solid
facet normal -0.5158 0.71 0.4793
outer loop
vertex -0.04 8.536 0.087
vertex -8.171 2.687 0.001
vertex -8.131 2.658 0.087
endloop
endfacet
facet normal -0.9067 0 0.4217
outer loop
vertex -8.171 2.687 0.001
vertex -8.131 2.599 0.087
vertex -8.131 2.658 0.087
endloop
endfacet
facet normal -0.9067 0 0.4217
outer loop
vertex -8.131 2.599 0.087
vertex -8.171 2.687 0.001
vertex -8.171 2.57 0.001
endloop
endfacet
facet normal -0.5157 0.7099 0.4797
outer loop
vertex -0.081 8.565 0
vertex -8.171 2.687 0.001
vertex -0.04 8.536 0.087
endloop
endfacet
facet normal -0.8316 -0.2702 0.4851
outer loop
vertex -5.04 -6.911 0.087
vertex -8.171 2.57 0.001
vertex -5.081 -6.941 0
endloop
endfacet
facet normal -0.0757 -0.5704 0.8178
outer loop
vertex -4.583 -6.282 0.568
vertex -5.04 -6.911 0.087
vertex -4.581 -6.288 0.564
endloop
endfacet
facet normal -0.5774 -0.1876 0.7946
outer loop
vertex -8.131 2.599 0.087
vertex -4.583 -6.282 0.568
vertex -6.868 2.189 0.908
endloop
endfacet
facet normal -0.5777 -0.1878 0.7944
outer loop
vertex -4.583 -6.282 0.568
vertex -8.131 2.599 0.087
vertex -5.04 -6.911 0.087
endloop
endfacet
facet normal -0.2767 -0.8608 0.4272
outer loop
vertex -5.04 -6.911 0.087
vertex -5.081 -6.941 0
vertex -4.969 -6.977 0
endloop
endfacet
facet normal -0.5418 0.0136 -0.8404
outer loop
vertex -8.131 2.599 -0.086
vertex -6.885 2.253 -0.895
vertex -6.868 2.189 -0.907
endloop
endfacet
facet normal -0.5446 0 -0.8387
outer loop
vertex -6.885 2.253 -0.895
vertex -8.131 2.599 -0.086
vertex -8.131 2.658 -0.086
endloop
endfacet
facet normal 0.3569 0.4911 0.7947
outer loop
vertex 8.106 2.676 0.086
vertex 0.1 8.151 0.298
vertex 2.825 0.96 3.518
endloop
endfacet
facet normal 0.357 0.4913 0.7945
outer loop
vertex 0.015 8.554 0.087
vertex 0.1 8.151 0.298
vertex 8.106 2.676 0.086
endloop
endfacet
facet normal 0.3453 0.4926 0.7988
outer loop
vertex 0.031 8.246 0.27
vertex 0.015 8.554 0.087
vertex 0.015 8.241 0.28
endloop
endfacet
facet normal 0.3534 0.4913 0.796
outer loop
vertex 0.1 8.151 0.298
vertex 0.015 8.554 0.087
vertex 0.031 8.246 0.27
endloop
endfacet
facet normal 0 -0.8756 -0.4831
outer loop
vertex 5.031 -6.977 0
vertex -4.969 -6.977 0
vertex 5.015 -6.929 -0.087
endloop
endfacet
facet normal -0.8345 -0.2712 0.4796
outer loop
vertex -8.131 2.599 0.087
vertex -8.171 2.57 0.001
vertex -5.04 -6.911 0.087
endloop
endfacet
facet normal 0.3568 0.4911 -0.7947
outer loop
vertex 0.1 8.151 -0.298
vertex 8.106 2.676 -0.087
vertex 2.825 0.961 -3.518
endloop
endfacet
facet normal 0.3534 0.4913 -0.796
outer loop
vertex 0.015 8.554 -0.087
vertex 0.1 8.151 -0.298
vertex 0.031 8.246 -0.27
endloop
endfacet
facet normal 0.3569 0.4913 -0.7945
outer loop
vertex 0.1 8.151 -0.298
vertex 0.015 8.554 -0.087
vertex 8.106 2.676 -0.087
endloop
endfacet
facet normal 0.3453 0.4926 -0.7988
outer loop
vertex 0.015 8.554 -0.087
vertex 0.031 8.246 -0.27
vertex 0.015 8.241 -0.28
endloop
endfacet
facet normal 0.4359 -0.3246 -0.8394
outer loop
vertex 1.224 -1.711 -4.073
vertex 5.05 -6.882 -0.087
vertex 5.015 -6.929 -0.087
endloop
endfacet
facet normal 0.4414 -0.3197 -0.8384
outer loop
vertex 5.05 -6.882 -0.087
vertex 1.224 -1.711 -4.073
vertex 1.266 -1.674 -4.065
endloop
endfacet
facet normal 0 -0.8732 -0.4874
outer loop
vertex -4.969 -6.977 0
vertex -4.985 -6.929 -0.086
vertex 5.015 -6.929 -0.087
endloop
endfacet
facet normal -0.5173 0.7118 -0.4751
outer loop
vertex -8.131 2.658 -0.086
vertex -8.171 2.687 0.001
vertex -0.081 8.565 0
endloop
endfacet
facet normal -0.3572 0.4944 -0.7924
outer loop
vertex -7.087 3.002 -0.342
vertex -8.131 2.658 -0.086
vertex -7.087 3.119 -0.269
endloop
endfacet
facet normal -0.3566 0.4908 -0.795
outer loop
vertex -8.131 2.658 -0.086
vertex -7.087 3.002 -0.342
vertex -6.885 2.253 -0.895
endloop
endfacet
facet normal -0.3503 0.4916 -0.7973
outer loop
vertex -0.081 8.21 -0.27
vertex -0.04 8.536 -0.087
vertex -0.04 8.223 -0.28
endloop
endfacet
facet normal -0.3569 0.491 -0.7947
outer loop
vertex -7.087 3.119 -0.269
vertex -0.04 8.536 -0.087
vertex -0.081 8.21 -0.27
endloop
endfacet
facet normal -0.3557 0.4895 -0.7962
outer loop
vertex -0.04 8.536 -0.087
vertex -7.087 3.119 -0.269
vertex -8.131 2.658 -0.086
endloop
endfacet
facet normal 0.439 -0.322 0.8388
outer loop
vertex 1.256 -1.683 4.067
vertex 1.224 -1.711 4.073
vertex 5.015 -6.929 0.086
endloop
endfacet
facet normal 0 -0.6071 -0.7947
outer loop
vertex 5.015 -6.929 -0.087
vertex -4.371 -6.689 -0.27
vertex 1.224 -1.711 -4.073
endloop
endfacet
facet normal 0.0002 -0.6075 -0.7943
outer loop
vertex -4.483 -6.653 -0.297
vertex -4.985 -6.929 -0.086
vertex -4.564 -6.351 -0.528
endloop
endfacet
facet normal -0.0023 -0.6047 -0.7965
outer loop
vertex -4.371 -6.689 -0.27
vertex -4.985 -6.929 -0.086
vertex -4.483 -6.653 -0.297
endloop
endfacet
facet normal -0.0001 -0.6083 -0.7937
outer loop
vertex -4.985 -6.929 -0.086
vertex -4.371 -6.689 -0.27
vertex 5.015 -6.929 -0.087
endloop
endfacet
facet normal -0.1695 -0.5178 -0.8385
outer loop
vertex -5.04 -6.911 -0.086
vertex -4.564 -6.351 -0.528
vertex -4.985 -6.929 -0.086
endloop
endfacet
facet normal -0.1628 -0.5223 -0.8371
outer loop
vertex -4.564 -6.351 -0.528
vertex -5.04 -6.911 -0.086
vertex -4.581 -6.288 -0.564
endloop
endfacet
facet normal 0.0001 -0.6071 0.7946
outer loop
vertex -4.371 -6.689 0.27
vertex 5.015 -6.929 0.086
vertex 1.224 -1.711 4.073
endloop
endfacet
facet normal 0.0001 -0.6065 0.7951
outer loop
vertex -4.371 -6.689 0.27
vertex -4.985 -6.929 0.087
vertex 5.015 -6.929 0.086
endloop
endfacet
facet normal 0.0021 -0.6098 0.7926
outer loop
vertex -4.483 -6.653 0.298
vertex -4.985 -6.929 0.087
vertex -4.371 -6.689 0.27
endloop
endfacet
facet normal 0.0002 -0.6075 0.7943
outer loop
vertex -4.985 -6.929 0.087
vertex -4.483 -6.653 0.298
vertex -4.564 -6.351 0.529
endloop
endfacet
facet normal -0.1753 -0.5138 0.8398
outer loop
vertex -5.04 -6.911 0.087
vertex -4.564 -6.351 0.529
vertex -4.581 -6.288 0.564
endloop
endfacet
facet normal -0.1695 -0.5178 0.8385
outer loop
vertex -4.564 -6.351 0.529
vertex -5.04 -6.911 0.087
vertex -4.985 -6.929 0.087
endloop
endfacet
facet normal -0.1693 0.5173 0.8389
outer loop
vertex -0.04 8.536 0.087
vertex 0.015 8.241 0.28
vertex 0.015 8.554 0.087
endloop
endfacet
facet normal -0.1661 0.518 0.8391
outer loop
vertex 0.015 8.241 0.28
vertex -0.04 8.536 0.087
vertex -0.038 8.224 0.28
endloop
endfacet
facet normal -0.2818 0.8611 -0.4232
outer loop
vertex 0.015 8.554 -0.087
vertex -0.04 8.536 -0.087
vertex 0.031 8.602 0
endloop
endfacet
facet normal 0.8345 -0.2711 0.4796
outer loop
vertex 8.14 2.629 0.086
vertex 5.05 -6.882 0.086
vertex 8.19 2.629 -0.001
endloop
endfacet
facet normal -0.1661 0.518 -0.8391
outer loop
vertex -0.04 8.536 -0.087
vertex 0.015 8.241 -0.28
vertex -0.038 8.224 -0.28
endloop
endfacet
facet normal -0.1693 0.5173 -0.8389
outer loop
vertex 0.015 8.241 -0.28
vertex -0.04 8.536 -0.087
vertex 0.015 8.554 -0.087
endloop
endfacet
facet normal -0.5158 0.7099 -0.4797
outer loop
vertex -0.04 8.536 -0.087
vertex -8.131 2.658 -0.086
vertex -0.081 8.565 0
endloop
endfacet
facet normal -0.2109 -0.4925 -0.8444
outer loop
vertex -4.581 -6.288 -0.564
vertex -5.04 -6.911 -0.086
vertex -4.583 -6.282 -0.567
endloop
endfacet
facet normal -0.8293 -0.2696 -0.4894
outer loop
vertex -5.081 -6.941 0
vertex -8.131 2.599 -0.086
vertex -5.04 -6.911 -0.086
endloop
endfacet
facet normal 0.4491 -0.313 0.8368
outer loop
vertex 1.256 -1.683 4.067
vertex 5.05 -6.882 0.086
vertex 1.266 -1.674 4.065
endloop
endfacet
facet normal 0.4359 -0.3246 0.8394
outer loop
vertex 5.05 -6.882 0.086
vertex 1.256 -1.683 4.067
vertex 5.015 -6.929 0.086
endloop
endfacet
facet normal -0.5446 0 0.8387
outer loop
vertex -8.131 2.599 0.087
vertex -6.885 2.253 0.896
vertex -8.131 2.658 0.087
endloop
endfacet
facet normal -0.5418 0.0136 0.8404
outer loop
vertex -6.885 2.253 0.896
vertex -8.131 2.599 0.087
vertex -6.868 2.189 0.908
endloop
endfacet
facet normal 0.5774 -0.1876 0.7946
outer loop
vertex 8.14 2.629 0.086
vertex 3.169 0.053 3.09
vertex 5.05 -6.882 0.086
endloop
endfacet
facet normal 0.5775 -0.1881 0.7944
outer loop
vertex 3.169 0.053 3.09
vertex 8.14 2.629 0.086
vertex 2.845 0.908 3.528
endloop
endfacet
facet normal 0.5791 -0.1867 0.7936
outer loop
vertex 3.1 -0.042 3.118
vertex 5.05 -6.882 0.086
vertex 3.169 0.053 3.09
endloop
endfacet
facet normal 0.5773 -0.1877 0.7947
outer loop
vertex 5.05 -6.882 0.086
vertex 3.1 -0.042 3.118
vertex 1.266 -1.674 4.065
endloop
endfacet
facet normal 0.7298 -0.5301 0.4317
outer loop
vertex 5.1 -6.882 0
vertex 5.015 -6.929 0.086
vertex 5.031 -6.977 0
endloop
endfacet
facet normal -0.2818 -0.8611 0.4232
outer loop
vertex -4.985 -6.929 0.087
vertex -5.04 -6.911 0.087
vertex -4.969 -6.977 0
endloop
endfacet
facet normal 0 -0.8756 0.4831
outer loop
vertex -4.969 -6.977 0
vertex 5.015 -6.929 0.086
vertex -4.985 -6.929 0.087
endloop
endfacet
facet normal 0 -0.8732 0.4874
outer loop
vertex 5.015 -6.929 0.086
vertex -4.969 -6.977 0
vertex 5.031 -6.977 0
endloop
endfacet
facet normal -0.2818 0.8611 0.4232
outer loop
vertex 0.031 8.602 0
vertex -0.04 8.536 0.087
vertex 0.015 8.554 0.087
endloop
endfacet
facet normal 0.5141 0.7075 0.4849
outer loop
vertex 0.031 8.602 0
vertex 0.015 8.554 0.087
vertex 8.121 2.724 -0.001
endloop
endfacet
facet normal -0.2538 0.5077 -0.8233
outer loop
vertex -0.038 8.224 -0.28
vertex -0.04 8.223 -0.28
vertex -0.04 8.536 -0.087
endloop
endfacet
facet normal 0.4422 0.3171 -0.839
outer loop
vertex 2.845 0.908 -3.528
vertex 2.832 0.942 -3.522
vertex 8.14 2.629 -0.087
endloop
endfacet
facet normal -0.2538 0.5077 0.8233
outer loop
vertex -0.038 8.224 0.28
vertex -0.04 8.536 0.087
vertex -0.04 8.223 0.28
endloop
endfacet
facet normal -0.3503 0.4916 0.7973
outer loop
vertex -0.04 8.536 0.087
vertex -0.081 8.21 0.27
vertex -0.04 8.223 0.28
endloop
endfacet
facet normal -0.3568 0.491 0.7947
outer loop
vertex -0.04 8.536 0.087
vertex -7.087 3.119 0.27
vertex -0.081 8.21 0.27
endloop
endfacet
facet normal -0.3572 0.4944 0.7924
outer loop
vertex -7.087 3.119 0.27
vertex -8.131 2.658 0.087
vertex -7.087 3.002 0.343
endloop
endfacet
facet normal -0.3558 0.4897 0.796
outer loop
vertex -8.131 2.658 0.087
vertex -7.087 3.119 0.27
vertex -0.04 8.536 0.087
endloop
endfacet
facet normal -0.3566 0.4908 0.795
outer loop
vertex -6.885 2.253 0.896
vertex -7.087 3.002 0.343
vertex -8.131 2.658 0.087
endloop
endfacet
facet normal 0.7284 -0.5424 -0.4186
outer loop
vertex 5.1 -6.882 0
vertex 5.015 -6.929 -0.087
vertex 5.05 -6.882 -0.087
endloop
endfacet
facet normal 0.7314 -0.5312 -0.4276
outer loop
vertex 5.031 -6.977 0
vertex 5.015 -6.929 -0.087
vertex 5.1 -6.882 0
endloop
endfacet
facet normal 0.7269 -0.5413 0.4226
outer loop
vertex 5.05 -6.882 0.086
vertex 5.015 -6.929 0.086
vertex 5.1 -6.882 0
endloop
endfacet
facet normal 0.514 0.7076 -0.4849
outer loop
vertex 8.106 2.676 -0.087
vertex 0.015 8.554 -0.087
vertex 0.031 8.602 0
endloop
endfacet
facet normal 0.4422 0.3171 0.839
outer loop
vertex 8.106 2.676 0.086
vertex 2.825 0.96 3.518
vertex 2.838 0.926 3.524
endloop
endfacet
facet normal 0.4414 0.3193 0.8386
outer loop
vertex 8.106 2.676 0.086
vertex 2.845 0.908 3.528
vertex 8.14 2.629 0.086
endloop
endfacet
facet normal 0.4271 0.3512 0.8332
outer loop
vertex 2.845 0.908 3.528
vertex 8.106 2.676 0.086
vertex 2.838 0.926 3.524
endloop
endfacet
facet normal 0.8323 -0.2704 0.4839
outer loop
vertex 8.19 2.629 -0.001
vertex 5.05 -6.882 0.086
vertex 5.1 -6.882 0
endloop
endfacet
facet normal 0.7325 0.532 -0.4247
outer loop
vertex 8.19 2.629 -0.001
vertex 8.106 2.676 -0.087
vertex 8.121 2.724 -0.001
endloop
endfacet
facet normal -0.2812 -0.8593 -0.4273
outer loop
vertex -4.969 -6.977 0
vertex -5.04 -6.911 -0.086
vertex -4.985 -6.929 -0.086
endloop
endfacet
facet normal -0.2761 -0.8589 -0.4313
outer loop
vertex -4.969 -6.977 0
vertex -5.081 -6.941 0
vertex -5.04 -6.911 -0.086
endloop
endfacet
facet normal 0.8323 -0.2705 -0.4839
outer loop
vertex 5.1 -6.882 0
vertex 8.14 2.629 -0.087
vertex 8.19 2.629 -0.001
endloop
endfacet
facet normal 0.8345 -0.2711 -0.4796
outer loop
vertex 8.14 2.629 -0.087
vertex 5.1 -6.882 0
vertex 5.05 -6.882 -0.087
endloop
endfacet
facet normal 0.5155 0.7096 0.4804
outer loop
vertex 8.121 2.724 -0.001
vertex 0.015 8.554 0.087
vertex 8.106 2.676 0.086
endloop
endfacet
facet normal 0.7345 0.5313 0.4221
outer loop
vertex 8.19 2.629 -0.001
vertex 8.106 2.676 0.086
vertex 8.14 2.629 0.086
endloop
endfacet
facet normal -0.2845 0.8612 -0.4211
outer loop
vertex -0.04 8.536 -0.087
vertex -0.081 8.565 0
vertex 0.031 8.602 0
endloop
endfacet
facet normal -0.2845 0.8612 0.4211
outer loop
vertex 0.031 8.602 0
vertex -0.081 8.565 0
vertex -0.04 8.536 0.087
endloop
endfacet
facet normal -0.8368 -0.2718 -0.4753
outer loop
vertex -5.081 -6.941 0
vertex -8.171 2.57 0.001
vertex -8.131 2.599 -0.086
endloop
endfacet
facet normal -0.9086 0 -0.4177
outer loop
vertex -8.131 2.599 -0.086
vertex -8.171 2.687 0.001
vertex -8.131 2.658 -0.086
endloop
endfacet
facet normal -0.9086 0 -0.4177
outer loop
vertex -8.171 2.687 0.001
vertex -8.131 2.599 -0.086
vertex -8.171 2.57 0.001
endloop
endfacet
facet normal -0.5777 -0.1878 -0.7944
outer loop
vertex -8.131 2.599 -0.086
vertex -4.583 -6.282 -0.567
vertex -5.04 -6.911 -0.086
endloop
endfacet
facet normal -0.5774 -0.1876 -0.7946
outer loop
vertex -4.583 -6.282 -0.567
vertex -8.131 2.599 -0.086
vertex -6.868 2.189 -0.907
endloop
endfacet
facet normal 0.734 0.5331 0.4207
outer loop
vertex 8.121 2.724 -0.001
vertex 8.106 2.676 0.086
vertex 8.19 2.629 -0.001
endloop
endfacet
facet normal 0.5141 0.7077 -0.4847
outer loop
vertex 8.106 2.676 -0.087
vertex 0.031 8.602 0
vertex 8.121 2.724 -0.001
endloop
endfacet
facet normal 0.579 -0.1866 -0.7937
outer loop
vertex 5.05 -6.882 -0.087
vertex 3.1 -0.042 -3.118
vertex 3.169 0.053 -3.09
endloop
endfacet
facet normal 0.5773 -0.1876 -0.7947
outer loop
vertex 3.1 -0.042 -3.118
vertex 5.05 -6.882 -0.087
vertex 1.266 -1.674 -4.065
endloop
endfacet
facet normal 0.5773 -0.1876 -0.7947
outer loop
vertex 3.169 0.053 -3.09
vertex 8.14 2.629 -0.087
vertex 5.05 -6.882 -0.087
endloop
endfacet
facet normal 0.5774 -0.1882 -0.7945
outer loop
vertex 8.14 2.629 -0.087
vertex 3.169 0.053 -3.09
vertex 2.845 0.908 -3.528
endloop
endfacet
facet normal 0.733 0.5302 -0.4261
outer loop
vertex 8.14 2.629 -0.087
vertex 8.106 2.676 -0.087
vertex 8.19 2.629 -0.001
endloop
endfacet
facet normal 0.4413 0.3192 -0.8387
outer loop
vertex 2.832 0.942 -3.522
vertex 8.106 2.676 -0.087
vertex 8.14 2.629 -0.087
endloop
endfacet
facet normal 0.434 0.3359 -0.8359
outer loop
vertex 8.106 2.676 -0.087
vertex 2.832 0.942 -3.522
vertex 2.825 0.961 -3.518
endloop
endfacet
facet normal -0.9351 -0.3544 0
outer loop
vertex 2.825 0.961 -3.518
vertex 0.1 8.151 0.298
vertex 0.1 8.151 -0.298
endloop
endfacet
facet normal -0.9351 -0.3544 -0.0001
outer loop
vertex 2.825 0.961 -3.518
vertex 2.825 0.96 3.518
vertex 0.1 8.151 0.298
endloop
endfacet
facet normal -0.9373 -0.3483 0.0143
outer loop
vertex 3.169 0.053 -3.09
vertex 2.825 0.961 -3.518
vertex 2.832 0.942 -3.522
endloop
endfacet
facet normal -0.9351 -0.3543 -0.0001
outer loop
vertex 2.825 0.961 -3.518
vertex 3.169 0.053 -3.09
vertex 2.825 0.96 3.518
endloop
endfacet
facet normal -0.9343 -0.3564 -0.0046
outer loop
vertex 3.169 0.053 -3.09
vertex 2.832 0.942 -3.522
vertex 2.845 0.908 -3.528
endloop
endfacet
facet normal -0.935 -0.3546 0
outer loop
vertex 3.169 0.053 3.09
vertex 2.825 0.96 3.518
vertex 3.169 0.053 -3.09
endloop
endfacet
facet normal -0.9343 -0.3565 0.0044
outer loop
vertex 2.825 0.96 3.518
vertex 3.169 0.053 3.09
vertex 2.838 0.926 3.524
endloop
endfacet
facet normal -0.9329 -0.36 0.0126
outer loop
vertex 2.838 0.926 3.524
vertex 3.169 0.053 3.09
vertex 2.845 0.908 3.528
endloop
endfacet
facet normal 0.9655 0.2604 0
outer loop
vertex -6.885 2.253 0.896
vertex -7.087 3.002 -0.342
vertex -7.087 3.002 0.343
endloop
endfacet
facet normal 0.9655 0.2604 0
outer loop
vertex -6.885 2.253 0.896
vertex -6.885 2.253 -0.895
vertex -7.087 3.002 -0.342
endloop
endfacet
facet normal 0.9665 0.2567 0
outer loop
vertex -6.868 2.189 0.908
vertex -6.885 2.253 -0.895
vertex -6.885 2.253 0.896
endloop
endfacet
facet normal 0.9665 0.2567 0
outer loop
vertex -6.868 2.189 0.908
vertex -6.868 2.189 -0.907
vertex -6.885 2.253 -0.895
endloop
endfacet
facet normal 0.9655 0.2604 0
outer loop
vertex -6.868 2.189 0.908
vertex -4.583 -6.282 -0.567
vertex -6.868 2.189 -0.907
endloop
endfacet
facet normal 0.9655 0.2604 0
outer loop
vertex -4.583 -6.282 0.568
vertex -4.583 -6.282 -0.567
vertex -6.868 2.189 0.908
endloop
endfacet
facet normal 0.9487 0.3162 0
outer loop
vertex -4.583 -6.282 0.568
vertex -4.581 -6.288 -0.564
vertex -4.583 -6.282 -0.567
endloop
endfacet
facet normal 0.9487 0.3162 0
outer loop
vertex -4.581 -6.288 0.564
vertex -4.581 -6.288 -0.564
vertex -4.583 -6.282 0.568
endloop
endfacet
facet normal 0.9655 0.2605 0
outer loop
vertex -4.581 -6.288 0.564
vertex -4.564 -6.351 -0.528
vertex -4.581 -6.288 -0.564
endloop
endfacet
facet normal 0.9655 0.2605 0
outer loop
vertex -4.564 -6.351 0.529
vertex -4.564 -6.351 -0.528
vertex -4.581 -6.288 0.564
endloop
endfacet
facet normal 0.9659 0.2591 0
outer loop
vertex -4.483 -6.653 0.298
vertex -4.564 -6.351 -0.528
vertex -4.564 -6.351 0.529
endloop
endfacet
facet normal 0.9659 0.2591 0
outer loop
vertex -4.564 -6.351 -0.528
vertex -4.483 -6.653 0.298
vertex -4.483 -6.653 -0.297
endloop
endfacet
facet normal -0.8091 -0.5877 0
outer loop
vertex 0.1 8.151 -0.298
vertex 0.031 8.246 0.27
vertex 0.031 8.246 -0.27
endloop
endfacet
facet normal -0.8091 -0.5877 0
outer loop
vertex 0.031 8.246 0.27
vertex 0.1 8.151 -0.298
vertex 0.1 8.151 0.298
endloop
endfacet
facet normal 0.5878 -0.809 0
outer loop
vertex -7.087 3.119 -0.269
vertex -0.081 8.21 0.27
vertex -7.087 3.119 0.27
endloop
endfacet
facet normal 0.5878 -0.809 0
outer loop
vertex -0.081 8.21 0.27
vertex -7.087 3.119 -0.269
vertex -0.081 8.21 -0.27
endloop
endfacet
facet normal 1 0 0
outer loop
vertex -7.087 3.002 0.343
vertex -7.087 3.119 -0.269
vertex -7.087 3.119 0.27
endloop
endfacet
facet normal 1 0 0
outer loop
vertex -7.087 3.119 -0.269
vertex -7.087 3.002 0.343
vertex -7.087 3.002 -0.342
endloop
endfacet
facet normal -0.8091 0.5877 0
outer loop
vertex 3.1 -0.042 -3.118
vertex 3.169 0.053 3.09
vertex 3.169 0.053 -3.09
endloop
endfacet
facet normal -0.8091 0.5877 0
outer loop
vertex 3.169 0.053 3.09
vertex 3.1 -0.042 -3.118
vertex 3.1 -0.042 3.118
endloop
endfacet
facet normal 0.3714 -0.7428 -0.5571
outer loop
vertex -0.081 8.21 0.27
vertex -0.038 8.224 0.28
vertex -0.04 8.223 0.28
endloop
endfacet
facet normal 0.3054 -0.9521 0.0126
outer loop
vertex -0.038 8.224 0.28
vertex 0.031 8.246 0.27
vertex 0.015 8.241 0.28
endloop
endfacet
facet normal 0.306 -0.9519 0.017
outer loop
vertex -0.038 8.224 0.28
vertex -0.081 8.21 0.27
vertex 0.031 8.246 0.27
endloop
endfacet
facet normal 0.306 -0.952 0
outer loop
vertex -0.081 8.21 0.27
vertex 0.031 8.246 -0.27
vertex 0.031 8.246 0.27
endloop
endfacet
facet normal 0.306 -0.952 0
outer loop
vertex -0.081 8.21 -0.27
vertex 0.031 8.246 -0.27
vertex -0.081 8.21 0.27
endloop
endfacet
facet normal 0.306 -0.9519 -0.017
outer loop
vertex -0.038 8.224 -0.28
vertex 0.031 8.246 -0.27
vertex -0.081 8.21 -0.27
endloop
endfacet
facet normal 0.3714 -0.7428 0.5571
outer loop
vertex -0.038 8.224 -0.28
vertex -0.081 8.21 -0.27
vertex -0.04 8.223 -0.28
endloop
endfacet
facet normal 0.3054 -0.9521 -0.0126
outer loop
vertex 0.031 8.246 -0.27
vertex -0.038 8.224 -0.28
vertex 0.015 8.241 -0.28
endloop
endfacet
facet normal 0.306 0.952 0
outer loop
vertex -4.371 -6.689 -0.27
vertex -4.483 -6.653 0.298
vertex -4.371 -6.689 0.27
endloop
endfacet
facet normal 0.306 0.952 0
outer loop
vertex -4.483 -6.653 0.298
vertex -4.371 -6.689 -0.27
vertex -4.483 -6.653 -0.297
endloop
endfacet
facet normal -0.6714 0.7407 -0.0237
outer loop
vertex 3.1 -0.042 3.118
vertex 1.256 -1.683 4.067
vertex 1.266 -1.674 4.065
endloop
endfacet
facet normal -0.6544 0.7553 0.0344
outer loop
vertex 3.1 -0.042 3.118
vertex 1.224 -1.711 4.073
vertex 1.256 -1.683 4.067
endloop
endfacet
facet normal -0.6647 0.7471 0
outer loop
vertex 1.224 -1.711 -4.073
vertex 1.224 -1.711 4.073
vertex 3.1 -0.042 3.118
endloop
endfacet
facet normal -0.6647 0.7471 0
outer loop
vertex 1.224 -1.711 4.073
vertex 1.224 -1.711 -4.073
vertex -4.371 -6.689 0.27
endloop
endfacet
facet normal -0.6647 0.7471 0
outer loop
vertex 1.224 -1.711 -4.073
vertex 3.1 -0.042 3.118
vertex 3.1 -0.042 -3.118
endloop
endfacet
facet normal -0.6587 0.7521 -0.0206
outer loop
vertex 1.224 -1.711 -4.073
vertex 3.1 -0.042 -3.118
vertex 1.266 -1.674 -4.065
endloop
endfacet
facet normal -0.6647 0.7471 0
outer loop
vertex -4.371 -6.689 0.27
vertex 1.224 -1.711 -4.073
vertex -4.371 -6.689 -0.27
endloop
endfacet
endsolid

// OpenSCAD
// Auto-generated OpenSCAD file

    inner_points = 10*[[-0.7006292682253485, 0.30606485476032513, -6.130120740868102e-13], [0.30689198471783646, 0.005276334587299036, 6.130120740868102e-13], [-0.2720657717976499, -0.09620971856082147, 0.8090169943752502], [-0.27206577179637514, -0.09620971856314678, -0.8090169943746447], [5.5554147393444e-10, 0.8151018158228152, 0.49999999999920747], [5.563293437038652e-10, 0.8151018158213781, -0.5000000000007926], [-0.4402116662866258, -0.6594312211511645, 9.79654968021913e-13]];

    outer_points = 10*[[-3.627212082769728e-05, 5.120611380175485e-06, -0.5257311108429229], [3.627212082769728e-05, -5.120611380175485e-06, 0.5257311108429229], [0.8090169926260806, 0.26286555604709816, -5.325674888357133e-05], [-0.8090169922727908, 0.26286555604709816, 5.837736025155943e-05], [0.4999999983475059, -0.6881909602029435, -4.1199804176948946e-05], [-0.4999999992724306, -0.6881909602029435, 2.779386957237699e-05], [5.716348896531026e-10, 0.8506508083116905, 8.285323236583849e-06]];

    // Convex hull for inner set (I)
    module inner_hull() {
        hull() {
            for (p = inner_points) {
                translate(p) sphere(r=0.1);
            }
        }
    }

    // Convex hull for outer set (O) minus inner hull (O \ I)
    module outer_minus_inner() {
        difference() {
            hull() {
                for (p = outer_points) {
                    translate(p) sphere(r=0.1);
                }
            }
            inner_hull(); // Subtract inner hull
        }
    }

    // Convex hull for outer set (O) minus all translated inner hulls
    module outer_minus_AllTranslationInner() {
        difference() {
            hull() {
                for (p = outer_points) {
                    translate(p) sphere(r=0.1);
                }
            }
            hull() {
                translate([0,0,50]) inner_hull();
                translate([0,0,-50]) inner_hull();
            }; // Subtract translated inner hulls
        }
    }

    // Difference between outer_minus_inner and outer_minus_AllTranslationInner
    module outer_minus_inner_diff() {
        difference() {
            // Outer minus inner
            difference() {
                hull() {
                    for (p = outer_points) {
                        translate(p) sphere(r=0.1);
                    }
                }
                inner_hull();
            }

            // Subtract Outer minus AllTranslationInner
            difference() {
                hull() {
                    for (p = outer_points) {
                        translate(p) sphere(r=0.1);
                    }
                }
                hull() {
                    translate([0,0,50]) inner_hull();
                    translate([0,0,-50]) inner_hull();
                };
            }
        }
    }

    // Rendering all with colors applied
    color([0, 1, 0, 1]) outer_minus_AllTranslationInner(); // Opaque green
    
